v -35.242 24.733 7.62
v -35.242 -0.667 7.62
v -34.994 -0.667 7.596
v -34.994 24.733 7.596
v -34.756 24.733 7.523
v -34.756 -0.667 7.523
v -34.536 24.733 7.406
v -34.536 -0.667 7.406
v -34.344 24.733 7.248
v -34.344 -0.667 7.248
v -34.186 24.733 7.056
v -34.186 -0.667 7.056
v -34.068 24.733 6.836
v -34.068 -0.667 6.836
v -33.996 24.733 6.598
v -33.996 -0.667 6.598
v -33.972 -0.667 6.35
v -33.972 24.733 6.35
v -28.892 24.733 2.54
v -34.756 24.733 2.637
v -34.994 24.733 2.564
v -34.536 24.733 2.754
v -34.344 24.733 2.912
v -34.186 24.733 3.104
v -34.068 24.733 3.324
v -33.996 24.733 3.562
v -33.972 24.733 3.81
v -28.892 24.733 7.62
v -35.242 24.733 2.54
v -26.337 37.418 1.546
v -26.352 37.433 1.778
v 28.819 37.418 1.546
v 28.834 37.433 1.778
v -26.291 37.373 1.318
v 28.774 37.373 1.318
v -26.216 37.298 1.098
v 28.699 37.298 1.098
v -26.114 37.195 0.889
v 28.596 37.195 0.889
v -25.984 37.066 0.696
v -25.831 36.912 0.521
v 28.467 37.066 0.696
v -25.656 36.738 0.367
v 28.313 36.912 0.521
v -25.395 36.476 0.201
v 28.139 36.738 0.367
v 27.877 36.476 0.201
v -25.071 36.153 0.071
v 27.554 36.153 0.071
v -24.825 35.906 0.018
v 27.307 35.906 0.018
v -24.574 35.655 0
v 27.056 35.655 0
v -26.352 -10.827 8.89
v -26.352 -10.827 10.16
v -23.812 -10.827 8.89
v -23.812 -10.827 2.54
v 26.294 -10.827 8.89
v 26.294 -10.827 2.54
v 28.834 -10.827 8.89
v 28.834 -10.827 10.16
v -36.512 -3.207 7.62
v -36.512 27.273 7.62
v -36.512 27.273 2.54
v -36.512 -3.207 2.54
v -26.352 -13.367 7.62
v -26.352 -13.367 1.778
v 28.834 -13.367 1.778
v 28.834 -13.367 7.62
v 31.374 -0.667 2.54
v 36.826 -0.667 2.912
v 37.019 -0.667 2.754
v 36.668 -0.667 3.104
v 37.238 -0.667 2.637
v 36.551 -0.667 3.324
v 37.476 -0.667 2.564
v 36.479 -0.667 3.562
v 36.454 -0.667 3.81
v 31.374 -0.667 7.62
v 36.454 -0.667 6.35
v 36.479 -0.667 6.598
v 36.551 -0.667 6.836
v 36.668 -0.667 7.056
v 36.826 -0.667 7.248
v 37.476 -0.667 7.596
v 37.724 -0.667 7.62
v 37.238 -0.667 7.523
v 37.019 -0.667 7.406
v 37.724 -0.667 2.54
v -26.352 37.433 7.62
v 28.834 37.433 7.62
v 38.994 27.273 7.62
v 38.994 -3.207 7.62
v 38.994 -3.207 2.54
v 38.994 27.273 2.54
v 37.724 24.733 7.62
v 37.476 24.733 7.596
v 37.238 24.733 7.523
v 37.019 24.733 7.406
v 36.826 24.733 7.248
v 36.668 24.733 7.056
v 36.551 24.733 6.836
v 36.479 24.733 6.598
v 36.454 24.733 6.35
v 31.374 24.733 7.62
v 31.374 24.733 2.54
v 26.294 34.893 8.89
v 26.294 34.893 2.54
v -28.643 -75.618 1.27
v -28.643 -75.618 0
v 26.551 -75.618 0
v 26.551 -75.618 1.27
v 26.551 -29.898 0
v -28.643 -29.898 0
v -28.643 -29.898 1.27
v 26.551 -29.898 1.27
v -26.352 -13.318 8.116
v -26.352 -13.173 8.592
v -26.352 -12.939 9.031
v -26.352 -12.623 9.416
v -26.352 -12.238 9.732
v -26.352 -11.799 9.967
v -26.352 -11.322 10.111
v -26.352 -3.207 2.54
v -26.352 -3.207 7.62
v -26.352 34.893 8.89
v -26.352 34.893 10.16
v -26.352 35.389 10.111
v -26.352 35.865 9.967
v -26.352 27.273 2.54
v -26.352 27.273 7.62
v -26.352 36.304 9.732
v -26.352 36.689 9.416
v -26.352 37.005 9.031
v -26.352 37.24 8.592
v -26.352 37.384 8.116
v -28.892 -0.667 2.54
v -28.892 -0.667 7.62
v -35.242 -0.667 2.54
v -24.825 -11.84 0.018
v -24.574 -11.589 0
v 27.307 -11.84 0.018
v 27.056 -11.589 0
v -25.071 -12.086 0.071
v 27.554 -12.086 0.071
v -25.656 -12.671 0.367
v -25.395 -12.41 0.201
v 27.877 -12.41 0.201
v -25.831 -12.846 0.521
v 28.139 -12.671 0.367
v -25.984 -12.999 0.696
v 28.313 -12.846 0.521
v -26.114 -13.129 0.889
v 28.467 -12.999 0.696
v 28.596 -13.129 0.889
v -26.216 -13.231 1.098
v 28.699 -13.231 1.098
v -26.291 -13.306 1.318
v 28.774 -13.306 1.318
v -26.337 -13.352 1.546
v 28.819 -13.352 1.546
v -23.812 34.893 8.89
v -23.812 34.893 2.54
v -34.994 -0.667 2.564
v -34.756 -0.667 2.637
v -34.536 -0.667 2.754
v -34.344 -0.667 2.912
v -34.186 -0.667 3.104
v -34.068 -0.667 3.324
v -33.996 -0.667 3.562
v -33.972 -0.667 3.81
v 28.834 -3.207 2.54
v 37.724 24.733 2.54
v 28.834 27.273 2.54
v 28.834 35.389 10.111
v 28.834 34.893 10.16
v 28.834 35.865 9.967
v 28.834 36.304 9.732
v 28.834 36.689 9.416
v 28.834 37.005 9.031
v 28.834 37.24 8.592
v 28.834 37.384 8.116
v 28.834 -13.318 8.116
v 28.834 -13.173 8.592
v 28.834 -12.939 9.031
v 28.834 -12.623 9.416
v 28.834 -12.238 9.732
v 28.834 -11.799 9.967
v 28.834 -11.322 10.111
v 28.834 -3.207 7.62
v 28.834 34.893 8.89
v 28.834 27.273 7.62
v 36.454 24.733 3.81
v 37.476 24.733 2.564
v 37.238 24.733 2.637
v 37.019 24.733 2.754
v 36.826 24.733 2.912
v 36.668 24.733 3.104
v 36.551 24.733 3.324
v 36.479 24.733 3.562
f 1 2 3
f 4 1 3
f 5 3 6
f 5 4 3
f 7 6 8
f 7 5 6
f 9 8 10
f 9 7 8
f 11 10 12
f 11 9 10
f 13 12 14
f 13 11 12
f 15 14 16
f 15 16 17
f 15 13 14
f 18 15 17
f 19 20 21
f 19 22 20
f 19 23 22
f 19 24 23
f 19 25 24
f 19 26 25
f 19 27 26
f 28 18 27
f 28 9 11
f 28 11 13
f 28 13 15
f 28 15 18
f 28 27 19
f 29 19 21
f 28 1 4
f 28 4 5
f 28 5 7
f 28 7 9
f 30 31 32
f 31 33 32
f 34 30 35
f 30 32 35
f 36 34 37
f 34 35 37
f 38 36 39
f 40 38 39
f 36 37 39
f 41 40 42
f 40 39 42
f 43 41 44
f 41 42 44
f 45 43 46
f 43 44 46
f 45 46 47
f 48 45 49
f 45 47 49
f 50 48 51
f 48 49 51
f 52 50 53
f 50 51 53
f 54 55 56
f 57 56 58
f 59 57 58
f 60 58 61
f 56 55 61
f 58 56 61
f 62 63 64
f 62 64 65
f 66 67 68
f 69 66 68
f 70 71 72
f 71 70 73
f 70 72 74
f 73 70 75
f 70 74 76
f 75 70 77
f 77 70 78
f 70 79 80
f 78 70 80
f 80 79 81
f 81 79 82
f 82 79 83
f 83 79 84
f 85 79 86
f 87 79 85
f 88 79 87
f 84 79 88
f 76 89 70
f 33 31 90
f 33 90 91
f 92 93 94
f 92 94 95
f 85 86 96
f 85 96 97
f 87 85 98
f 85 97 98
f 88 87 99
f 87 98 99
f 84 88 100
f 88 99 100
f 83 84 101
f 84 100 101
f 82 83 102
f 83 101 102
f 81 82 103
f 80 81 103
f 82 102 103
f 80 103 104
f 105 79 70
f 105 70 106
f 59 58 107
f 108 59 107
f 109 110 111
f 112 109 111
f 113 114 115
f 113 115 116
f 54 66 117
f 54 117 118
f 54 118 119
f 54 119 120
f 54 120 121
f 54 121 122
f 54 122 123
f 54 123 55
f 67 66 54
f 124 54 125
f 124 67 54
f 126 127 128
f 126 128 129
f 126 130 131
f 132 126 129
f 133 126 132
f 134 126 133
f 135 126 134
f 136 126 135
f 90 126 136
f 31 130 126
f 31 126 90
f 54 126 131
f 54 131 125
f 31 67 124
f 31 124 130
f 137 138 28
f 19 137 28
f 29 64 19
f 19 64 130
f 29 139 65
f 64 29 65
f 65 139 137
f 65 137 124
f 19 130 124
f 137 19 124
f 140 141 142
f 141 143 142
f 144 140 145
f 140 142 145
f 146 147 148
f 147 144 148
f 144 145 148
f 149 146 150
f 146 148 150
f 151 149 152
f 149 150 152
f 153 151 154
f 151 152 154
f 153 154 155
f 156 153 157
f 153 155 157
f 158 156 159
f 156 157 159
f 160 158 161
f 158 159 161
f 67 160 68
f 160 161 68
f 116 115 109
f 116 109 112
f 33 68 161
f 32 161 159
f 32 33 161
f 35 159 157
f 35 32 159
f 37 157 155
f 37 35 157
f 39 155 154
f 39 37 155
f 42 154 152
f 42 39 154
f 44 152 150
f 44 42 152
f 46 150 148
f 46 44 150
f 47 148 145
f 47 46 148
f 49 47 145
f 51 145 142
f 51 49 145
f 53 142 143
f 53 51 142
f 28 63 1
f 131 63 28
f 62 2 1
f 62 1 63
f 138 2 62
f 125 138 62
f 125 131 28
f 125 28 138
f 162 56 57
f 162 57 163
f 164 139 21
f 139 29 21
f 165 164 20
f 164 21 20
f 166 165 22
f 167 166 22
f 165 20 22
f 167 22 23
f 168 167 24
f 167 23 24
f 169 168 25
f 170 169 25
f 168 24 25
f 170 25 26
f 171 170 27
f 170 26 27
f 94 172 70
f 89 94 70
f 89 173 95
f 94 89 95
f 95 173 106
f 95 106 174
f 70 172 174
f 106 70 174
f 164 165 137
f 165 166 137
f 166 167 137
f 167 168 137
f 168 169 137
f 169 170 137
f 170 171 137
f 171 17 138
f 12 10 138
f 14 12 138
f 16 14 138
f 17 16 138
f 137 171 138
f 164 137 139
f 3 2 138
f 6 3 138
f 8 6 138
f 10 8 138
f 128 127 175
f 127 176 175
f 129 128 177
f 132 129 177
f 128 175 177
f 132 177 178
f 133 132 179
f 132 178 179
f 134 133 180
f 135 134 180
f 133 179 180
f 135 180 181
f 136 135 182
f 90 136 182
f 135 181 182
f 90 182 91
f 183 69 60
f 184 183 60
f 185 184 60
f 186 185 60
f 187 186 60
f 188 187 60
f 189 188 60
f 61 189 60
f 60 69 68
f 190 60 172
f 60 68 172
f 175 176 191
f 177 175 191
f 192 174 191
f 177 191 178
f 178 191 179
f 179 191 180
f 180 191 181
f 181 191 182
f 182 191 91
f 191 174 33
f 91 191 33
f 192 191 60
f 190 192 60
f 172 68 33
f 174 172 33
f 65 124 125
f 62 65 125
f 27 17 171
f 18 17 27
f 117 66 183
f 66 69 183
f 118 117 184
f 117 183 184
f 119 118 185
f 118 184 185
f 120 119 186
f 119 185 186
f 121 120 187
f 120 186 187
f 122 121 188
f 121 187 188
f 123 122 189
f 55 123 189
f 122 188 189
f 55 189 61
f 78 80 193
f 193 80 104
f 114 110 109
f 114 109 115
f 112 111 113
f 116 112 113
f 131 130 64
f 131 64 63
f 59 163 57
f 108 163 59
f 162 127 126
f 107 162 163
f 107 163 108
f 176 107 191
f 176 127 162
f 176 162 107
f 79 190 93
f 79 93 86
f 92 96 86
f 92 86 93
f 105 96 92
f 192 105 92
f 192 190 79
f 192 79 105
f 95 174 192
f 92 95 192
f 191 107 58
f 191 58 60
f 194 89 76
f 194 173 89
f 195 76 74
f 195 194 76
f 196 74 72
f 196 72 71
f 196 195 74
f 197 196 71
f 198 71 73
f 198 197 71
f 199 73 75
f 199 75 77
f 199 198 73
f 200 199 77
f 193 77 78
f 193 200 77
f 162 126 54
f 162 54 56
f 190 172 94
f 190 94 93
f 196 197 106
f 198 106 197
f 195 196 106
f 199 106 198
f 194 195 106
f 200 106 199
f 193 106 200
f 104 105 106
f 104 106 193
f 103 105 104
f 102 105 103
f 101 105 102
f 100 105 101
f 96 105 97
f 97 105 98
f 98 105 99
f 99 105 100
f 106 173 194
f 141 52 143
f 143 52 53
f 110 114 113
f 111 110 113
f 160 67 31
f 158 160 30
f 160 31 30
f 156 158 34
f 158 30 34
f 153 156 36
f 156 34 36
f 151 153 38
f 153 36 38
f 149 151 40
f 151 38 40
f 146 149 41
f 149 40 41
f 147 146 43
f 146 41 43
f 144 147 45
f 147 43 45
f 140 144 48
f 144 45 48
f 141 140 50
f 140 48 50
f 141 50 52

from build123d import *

# Parameters (mm, degrees)
F0_W      = 55.1858954132
F0_H      = 50.8
F1_DEPTH  = 10.16
F2_W      = 30.48
F2_H      = 5.08
F3_DEPTH  = 10.16
F4_W      = 30.48
F4_H      = 5.08
F5_DEPTH  = 10.16
F6_W      = 50.1058954132
F6_H      = 45.72
F7_DEPTH  = 7.62
F8_R      = 2.53999
F9_W      = 2.54
F9_H      = 45.72
F10_DEPTH = 1.27
F11_W     = 55.1942
F11_H     = 45.72
F12_DEPTH = 1.27
F13_W     = 5.08
F13_H     = 25.4
F14_DEPTH = 25.4
F15_R     = 1.27
F16_R     = 1.778


# Not quite as in the source:
# - a fillet or chamfer is up to 0.001 mm smaller than in the source, because OpenCascade refuses the exact size


with BuildPart() as f1:
    # F0 (on Top) → F1 (new body)
    with BuildSketch(Plane.XY):
        with Locations((1.2412052602, 12.0331741214)):
            Rectangle(F0_W, F0_H)
    extrude(amount=F1_DEPTH)

    # F2 (on face) → F3 (join)
    with BuildSketch(Plane.YZ.offset(28.8341529667)):
        with Locations((12.0331741214, 5.08)):
            Rectangle(F2_W, F2_H)
    extrude(amount=F3_DEPTH)

    # F4 (on face) → F5 (join)
    with BuildSketch(Plane(origin=(-26.3517424464, 0, 0), x_dir=(0, -1, 0), z_dir=(-1, 0, 0))):
        with Locations((-12.0331741214, 5.08)):
            Rectangle(F4_W, F4_H)
    extrude(amount=F5_DEPTH)

    # F6 (on face) → F7 (cut)
    with BuildSketch(Plane.XY.offset(10.16)):
        with Locations((1.2412052602, 12.0331741214)):
            Rectangle(F6_W, F6_H)
    extrude(amount=-F7_DEPTH, mode=Mode.SUBTRACT)

    # F8 (radius 2.54 in the source; OpenCascade refuses exactly that, so slightly less here)
    f8_edges = [f1.edges().sort_by_distance(p)[0] for p in [
        (1.241205, -13.366826, 10.16),
        (1.241205, 37.433174, 10.16),
    ]]
    fillet(f8_edges, radius=F8_R)

    # F9 (on face) → F10 (cut)
    with BuildSketch(Plane.XY.offset(10.16)):
        with Locations((27.5641529667, 12.0331741214)):
            Rectangle(F9_W, F9_H)
        with Locations((-25.0817424464, 12.0331741214)):
            Rectangle(F9_W, F9_H)
    extrude(amount=-F10_DEPTH, mode=Mode.SUBTRACT)

    # F13 (on face) → F14 (cut)
    with BuildSketch(Plane.XY.offset(7.62)):
        with Locations((-31.4317424464, 12.0331741214)):
            Rectangle(F13_W, F13_H)
        with Locations((33.9141529667, 12.0331741214)):
            Rectangle(F13_W, F13_H)
    extrude(amount=-F14_DEPTH, mode=Mode.SUBTRACT)

    # F15
    f15_edges = [f1.edges().sort_by_distance(p)[0] for p in [
        (-33.971742, 12.033174, 7.62),
        (-33.971742, 12.033174, 2.54),
        (36.454153, 12.033174, 2.54),
        (36.454153, 12.033174, 7.62),
    ]]
    fillet(f15_edges, radius=F15_R)

    # F16
    f16_edges = [f1.edges().sort_by_distance(p)[0] for p in [
        (28.834153, 12.033174, 0),
        (1.241205, 37.433174, 0),
        (-26.351742, 12.033174, 0),
        (1.241205, -13.366826, 0),
    ]]
    fillet(f16_edges, radius=F16_R)


with BuildPart() as f12:
    # F11 (on Top) → F12 (new body)
    with BuildSketch(Plane.XY):
        with Locations((-1.0460983113, -52.7580435419)):
            Rectangle(F11_W, F11_H)
    extrude(amount=F12_DEPTH)


solid = Compound([f1.part, f12.part])
